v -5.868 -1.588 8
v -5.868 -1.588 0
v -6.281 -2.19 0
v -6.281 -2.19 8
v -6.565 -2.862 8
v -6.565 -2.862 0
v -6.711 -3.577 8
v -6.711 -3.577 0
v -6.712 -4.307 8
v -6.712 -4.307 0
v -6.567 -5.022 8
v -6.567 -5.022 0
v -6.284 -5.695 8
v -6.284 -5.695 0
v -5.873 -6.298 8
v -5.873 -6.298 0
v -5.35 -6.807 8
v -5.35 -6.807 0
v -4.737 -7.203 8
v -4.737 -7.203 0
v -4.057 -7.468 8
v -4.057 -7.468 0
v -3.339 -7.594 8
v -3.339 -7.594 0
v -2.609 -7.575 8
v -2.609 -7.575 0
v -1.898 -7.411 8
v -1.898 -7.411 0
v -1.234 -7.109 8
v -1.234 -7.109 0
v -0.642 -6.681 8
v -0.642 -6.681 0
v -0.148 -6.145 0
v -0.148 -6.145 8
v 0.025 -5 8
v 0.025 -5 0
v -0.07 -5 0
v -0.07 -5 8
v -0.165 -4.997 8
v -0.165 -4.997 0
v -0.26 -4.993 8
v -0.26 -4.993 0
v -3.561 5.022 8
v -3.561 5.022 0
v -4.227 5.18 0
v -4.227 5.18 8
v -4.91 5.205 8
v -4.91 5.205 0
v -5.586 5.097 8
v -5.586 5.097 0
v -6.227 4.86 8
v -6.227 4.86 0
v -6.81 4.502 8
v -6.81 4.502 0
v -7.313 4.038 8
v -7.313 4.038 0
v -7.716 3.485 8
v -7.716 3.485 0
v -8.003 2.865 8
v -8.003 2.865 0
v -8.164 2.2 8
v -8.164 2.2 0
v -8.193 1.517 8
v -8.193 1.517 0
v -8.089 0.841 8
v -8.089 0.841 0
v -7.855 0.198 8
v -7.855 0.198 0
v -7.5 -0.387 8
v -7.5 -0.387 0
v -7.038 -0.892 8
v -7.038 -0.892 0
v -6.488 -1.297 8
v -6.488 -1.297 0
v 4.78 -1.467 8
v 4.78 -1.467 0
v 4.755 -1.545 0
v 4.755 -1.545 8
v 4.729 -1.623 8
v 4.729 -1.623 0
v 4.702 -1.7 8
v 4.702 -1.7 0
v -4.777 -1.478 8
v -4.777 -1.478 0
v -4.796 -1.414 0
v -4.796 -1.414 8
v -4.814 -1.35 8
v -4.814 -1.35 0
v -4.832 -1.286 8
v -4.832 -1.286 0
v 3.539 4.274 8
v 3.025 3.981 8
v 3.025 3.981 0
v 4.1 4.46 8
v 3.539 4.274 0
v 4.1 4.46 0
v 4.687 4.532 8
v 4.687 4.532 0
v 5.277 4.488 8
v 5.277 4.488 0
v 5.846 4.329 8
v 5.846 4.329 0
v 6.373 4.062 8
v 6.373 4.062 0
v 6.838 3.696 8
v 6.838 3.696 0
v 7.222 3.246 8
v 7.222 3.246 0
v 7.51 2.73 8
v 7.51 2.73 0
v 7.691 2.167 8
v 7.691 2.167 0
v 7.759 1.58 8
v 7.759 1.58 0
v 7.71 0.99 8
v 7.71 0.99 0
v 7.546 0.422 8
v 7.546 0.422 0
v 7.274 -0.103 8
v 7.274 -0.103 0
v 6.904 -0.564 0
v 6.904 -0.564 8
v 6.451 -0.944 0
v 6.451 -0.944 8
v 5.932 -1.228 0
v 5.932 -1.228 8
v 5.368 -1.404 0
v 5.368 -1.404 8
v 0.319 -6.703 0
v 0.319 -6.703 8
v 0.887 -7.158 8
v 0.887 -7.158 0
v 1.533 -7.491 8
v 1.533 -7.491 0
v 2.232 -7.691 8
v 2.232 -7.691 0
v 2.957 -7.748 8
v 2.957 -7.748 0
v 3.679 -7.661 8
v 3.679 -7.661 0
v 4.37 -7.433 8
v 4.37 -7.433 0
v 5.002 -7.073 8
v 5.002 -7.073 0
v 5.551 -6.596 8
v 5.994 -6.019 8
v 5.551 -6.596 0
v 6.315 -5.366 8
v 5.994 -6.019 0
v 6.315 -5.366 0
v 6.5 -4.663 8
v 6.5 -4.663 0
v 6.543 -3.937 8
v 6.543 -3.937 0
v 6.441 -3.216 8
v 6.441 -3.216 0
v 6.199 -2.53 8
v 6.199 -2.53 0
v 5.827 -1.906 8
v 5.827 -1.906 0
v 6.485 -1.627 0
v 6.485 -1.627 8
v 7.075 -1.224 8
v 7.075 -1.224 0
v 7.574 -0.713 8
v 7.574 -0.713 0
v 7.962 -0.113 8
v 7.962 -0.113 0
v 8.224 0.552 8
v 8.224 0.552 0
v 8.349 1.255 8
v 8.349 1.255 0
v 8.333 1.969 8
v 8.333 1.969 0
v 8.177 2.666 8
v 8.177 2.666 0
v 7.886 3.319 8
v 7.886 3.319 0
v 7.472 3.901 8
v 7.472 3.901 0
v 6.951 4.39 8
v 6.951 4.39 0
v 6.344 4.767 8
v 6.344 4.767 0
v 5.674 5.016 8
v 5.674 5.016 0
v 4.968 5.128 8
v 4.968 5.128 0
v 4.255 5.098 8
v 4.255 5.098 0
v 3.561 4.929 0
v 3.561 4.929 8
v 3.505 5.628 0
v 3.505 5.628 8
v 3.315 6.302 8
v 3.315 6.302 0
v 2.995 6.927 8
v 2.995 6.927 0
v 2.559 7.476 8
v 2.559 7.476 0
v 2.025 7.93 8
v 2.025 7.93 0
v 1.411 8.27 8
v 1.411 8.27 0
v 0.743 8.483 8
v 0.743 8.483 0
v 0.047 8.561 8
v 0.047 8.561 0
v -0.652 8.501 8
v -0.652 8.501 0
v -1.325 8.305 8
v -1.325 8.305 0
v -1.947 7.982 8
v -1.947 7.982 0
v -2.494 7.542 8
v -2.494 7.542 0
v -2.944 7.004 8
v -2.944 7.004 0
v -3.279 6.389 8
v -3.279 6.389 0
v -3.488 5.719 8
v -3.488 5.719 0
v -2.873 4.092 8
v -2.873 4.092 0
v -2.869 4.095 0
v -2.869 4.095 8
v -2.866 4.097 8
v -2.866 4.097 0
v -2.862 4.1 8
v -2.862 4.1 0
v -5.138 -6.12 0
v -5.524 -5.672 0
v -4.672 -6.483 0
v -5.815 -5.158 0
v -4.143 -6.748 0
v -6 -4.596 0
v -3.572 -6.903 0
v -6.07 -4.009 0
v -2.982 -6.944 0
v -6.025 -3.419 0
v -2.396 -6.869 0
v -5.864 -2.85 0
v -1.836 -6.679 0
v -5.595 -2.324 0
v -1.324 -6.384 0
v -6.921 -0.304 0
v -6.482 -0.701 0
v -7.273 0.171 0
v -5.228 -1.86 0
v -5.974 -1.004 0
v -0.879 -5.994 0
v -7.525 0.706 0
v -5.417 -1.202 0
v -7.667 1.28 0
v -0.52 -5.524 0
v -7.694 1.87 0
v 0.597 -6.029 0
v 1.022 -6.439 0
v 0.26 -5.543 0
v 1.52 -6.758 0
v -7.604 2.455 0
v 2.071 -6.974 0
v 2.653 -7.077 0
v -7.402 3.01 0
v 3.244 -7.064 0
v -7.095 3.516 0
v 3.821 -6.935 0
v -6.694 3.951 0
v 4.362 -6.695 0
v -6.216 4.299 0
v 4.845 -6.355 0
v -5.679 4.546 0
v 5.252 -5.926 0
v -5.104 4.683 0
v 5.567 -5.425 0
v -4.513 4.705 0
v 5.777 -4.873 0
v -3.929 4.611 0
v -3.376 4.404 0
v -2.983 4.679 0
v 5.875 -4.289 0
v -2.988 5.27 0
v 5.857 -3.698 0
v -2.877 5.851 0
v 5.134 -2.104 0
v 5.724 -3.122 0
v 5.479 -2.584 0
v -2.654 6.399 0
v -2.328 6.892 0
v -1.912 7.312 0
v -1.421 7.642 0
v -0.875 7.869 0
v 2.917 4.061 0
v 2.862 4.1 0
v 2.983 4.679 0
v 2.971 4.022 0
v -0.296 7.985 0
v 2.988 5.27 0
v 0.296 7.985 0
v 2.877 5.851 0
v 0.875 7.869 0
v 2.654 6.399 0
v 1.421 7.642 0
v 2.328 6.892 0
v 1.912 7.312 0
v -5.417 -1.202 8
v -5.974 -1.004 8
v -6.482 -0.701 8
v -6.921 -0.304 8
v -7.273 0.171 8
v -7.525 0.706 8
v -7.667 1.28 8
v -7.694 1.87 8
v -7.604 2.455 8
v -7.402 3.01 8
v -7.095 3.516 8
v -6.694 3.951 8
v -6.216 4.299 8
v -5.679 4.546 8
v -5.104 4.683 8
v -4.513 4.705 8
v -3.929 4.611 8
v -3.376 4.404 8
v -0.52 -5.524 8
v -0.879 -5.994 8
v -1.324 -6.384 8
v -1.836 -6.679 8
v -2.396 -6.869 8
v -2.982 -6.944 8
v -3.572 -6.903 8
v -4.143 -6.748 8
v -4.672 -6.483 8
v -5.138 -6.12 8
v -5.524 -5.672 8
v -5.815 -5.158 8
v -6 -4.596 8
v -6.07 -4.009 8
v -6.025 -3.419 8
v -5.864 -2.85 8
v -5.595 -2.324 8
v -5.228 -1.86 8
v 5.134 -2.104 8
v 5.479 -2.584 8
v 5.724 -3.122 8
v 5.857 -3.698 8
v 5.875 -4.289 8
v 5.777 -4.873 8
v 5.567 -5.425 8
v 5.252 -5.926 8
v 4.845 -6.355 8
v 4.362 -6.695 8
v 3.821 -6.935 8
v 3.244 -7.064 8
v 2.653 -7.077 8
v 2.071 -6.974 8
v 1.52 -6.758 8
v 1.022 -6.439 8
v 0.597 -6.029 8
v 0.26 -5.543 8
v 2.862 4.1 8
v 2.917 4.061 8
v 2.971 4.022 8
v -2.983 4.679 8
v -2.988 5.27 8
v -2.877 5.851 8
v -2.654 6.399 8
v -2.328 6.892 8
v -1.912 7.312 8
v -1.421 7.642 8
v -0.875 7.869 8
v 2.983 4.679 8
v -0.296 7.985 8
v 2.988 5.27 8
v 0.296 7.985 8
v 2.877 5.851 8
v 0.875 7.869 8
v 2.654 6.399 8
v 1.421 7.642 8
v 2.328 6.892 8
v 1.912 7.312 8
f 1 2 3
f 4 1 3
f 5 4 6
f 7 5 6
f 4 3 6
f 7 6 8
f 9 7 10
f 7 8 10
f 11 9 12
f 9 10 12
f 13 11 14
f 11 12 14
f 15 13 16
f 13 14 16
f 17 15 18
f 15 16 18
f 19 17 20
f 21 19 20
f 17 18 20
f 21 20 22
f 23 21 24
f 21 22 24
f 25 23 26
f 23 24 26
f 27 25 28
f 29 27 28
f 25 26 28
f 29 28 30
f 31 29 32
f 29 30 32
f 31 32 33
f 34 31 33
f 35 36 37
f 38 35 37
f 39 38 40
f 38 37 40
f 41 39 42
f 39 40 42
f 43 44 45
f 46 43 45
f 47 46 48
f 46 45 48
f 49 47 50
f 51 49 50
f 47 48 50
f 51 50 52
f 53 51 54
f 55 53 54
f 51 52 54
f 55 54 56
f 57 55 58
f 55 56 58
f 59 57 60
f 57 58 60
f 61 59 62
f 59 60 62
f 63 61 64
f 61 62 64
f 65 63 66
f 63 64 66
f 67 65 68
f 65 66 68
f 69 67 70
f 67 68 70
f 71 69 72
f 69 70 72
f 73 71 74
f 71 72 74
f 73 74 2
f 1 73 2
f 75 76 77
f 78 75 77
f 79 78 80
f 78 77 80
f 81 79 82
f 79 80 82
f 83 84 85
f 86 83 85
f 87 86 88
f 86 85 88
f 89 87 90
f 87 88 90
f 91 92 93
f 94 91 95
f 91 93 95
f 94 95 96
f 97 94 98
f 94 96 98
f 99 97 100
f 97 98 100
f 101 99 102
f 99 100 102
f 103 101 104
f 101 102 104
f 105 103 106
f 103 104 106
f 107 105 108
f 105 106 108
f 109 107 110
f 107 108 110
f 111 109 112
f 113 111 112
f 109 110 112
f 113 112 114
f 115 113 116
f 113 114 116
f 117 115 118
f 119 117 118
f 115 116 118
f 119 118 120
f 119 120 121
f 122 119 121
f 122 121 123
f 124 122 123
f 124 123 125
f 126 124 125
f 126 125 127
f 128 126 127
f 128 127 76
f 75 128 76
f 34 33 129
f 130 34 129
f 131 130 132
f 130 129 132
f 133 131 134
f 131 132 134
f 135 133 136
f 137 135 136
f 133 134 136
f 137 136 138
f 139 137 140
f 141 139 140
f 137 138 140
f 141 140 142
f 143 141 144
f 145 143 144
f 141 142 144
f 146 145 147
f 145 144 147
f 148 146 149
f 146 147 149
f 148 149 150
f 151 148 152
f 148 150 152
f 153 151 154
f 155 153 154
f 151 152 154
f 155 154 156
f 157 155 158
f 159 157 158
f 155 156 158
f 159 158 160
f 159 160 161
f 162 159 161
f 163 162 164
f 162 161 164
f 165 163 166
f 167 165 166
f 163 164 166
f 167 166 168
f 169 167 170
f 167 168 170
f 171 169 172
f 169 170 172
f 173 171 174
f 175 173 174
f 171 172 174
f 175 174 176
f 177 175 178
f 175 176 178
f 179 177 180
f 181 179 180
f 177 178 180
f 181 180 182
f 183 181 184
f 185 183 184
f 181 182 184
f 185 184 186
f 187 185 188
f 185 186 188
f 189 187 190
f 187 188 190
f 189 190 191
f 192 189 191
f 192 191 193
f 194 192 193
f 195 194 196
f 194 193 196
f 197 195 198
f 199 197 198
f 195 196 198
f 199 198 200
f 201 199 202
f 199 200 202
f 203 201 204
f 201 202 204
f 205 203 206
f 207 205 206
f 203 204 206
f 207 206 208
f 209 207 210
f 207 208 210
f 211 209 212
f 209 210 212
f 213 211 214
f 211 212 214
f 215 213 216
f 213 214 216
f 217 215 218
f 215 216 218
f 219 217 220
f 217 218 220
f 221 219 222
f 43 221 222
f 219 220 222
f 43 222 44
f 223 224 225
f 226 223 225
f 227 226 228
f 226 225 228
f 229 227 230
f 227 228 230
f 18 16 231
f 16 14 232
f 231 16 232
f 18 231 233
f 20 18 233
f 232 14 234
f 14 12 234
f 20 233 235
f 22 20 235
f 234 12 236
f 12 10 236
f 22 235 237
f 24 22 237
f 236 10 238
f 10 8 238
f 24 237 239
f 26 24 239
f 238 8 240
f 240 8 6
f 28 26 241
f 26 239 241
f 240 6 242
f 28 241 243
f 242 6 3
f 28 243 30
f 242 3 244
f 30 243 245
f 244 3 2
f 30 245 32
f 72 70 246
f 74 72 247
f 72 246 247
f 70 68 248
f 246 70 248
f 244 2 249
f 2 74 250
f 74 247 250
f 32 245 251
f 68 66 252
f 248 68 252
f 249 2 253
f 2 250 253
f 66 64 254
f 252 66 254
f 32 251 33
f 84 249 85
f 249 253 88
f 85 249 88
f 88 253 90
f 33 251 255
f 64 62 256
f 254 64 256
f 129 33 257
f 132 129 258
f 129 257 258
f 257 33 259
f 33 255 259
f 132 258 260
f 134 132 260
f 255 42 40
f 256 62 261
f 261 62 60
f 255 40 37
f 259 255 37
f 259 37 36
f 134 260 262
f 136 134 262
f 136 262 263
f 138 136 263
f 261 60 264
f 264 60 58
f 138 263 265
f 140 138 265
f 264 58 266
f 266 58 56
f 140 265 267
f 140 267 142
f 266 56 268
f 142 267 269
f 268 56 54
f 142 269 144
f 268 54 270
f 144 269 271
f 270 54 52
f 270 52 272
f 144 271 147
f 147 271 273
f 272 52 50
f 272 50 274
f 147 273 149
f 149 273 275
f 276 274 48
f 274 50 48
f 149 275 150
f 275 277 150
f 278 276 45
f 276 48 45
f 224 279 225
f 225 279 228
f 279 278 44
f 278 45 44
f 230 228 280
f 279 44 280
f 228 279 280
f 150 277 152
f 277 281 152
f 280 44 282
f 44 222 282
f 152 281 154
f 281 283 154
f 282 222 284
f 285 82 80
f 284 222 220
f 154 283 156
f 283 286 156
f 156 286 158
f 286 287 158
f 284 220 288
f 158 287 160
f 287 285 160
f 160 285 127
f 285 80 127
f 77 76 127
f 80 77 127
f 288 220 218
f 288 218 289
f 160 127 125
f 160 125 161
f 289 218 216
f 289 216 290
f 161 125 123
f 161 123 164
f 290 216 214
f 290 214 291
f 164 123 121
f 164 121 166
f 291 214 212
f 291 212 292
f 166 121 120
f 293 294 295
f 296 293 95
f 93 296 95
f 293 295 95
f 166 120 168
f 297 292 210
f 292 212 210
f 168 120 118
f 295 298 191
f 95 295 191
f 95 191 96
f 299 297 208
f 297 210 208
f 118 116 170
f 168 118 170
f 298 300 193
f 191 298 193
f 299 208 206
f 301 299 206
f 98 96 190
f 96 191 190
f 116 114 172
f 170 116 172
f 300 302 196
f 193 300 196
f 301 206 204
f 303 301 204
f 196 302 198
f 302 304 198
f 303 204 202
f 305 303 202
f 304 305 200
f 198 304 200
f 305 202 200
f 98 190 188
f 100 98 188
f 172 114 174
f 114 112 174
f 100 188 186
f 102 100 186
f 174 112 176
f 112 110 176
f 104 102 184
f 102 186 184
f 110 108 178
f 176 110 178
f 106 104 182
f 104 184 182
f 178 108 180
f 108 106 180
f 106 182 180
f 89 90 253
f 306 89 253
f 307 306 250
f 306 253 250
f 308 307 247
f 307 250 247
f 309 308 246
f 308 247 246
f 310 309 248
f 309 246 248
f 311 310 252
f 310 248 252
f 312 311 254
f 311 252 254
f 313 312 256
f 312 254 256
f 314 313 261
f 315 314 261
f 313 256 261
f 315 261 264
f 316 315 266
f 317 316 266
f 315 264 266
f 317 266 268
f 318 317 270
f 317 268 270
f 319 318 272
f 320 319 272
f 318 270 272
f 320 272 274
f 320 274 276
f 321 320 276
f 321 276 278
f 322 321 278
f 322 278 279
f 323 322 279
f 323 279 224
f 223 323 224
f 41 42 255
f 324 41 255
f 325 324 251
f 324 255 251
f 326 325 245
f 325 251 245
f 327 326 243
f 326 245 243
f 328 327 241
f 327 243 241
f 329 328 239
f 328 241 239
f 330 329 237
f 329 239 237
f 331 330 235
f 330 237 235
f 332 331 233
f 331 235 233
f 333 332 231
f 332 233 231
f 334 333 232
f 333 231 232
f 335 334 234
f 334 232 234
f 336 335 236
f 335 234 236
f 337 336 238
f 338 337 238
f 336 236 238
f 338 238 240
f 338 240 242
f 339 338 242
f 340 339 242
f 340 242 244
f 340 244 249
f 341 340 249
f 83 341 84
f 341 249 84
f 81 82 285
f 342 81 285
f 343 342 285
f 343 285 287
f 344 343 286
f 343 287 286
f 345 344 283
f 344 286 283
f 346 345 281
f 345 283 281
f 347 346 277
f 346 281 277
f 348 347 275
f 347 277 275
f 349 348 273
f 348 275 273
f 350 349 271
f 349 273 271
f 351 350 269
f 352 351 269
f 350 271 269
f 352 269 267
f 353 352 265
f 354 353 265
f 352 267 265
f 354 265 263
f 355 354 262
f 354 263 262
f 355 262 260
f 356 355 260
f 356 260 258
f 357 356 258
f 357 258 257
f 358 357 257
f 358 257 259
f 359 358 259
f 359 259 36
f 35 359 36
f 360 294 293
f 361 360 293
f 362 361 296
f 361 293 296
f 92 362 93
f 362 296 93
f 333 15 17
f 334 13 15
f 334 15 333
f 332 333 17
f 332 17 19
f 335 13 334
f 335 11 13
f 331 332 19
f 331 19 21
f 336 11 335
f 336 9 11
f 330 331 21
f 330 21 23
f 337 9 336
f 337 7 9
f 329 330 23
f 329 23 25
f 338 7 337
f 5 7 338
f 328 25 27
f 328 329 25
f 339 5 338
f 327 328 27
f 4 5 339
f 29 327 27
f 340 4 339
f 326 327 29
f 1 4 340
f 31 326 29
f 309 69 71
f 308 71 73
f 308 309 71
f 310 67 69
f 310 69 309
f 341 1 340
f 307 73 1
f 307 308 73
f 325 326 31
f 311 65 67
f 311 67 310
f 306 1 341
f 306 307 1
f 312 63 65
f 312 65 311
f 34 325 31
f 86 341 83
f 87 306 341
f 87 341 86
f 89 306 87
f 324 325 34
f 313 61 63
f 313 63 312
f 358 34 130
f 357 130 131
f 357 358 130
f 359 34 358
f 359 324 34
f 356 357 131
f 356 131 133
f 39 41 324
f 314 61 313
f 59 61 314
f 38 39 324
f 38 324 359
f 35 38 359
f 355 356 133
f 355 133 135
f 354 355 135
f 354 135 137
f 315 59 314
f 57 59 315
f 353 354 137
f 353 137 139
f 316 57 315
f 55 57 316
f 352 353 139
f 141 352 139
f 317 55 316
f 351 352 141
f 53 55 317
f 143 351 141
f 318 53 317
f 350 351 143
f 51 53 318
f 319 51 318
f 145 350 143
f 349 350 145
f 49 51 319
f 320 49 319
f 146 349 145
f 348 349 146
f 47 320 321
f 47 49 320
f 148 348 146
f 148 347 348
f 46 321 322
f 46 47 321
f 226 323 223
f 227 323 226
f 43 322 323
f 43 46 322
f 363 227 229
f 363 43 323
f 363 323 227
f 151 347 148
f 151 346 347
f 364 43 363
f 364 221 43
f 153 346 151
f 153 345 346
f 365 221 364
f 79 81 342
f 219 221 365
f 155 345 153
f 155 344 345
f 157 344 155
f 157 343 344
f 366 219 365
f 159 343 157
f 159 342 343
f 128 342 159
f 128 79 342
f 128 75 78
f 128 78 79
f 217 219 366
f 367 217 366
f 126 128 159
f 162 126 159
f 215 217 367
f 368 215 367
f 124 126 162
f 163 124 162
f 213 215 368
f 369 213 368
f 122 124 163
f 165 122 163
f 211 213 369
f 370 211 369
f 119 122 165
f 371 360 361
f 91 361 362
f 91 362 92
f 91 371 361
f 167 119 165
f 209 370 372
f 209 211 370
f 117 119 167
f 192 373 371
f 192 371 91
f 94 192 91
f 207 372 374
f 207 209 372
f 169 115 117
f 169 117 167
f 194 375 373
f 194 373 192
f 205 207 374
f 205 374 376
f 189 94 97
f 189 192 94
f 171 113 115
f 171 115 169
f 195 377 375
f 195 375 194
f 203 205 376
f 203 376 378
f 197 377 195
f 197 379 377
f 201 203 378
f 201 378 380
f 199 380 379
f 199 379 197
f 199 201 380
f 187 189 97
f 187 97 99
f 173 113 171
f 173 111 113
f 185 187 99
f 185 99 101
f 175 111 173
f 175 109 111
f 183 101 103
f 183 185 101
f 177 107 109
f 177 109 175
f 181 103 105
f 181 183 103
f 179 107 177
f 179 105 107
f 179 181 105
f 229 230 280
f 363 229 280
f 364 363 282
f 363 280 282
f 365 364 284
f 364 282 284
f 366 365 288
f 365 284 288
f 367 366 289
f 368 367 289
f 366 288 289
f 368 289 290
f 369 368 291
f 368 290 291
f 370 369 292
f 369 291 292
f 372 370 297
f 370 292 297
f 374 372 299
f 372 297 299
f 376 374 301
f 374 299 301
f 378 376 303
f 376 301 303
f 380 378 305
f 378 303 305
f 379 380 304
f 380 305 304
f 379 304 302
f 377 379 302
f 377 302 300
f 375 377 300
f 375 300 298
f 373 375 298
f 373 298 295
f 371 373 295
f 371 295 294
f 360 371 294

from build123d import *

# Parameters (mm, degrees)
F1_DEPTH = 8


with BuildPart() as f1:
    # F0 (on Top) → F1 (new body)
    with BuildSketch(Plane.XY):
        with BuildLine():
            ThreePointArc((-3.561162, 5.021676), (-8.002963, 2.864677), (-5.868373, -1.587937))
            ThreePointArc((-5.868373, -1.587937), (-5.350405, -6.807139), (-0.147566, -6.144698))
            ThreePointArc((-0.147566, -6.144698), (5.002213, -7.073285), (5.826574, -1.905798))
            ThreePointArc((5.826574, -1.905798), (8.176987, 2.66641), (3.560513, 4.928642))
            ThreePointArc((3.560513, 4.928642), (0.046518, 8.560924), (-3.561162, 5.021676))
        make_face()
        with BuildLine():
            ThreePointArc((-4.77668, -1.477608), (-4.805196, -1.382061), (-4.831801, -1.285963))
            ThreePointArc((-4.831801, -1.285963), (-7.516984, 2.73769), (-2.873108, 4.092096))
            ThreePointArc((-2.873108, 4.092096), (-2.867466, 4.096052), (-2.861818, 4.1))
            ThreePointArc((-2.861818, 4.1), (0, 8), (2.861818, 4.1))
            ThreePointArc((2.861818, 4.1), (2.943989, 4.041402), (3.024962, 3.981156))
            ThreePointArc((3.024962, 3.981156), (7.61462, 2.453073), (4.780023, -1.466757))
            ThreePointArc((4.780023, -1.466757), (4.742433, -1.584087), (4.701962, -1.700456))
            ThreePointArc((4.701962, -1.700456), (4.611728, -6.536969), (0.025059, -4.999937))
            ThreePointArc((0.025059, -4.999937), (-0.11752, -4.998619), (-0.260004, -4.993235))
            ThreePointArc((-0.260004, -4.993235), (-4.913838, -6.313018), (-4.77668, -1.477608))
        make_face(mode=Mode.SUBTRACT)
    extrude(amount=F1_DEPTH)


solid = f1.part
